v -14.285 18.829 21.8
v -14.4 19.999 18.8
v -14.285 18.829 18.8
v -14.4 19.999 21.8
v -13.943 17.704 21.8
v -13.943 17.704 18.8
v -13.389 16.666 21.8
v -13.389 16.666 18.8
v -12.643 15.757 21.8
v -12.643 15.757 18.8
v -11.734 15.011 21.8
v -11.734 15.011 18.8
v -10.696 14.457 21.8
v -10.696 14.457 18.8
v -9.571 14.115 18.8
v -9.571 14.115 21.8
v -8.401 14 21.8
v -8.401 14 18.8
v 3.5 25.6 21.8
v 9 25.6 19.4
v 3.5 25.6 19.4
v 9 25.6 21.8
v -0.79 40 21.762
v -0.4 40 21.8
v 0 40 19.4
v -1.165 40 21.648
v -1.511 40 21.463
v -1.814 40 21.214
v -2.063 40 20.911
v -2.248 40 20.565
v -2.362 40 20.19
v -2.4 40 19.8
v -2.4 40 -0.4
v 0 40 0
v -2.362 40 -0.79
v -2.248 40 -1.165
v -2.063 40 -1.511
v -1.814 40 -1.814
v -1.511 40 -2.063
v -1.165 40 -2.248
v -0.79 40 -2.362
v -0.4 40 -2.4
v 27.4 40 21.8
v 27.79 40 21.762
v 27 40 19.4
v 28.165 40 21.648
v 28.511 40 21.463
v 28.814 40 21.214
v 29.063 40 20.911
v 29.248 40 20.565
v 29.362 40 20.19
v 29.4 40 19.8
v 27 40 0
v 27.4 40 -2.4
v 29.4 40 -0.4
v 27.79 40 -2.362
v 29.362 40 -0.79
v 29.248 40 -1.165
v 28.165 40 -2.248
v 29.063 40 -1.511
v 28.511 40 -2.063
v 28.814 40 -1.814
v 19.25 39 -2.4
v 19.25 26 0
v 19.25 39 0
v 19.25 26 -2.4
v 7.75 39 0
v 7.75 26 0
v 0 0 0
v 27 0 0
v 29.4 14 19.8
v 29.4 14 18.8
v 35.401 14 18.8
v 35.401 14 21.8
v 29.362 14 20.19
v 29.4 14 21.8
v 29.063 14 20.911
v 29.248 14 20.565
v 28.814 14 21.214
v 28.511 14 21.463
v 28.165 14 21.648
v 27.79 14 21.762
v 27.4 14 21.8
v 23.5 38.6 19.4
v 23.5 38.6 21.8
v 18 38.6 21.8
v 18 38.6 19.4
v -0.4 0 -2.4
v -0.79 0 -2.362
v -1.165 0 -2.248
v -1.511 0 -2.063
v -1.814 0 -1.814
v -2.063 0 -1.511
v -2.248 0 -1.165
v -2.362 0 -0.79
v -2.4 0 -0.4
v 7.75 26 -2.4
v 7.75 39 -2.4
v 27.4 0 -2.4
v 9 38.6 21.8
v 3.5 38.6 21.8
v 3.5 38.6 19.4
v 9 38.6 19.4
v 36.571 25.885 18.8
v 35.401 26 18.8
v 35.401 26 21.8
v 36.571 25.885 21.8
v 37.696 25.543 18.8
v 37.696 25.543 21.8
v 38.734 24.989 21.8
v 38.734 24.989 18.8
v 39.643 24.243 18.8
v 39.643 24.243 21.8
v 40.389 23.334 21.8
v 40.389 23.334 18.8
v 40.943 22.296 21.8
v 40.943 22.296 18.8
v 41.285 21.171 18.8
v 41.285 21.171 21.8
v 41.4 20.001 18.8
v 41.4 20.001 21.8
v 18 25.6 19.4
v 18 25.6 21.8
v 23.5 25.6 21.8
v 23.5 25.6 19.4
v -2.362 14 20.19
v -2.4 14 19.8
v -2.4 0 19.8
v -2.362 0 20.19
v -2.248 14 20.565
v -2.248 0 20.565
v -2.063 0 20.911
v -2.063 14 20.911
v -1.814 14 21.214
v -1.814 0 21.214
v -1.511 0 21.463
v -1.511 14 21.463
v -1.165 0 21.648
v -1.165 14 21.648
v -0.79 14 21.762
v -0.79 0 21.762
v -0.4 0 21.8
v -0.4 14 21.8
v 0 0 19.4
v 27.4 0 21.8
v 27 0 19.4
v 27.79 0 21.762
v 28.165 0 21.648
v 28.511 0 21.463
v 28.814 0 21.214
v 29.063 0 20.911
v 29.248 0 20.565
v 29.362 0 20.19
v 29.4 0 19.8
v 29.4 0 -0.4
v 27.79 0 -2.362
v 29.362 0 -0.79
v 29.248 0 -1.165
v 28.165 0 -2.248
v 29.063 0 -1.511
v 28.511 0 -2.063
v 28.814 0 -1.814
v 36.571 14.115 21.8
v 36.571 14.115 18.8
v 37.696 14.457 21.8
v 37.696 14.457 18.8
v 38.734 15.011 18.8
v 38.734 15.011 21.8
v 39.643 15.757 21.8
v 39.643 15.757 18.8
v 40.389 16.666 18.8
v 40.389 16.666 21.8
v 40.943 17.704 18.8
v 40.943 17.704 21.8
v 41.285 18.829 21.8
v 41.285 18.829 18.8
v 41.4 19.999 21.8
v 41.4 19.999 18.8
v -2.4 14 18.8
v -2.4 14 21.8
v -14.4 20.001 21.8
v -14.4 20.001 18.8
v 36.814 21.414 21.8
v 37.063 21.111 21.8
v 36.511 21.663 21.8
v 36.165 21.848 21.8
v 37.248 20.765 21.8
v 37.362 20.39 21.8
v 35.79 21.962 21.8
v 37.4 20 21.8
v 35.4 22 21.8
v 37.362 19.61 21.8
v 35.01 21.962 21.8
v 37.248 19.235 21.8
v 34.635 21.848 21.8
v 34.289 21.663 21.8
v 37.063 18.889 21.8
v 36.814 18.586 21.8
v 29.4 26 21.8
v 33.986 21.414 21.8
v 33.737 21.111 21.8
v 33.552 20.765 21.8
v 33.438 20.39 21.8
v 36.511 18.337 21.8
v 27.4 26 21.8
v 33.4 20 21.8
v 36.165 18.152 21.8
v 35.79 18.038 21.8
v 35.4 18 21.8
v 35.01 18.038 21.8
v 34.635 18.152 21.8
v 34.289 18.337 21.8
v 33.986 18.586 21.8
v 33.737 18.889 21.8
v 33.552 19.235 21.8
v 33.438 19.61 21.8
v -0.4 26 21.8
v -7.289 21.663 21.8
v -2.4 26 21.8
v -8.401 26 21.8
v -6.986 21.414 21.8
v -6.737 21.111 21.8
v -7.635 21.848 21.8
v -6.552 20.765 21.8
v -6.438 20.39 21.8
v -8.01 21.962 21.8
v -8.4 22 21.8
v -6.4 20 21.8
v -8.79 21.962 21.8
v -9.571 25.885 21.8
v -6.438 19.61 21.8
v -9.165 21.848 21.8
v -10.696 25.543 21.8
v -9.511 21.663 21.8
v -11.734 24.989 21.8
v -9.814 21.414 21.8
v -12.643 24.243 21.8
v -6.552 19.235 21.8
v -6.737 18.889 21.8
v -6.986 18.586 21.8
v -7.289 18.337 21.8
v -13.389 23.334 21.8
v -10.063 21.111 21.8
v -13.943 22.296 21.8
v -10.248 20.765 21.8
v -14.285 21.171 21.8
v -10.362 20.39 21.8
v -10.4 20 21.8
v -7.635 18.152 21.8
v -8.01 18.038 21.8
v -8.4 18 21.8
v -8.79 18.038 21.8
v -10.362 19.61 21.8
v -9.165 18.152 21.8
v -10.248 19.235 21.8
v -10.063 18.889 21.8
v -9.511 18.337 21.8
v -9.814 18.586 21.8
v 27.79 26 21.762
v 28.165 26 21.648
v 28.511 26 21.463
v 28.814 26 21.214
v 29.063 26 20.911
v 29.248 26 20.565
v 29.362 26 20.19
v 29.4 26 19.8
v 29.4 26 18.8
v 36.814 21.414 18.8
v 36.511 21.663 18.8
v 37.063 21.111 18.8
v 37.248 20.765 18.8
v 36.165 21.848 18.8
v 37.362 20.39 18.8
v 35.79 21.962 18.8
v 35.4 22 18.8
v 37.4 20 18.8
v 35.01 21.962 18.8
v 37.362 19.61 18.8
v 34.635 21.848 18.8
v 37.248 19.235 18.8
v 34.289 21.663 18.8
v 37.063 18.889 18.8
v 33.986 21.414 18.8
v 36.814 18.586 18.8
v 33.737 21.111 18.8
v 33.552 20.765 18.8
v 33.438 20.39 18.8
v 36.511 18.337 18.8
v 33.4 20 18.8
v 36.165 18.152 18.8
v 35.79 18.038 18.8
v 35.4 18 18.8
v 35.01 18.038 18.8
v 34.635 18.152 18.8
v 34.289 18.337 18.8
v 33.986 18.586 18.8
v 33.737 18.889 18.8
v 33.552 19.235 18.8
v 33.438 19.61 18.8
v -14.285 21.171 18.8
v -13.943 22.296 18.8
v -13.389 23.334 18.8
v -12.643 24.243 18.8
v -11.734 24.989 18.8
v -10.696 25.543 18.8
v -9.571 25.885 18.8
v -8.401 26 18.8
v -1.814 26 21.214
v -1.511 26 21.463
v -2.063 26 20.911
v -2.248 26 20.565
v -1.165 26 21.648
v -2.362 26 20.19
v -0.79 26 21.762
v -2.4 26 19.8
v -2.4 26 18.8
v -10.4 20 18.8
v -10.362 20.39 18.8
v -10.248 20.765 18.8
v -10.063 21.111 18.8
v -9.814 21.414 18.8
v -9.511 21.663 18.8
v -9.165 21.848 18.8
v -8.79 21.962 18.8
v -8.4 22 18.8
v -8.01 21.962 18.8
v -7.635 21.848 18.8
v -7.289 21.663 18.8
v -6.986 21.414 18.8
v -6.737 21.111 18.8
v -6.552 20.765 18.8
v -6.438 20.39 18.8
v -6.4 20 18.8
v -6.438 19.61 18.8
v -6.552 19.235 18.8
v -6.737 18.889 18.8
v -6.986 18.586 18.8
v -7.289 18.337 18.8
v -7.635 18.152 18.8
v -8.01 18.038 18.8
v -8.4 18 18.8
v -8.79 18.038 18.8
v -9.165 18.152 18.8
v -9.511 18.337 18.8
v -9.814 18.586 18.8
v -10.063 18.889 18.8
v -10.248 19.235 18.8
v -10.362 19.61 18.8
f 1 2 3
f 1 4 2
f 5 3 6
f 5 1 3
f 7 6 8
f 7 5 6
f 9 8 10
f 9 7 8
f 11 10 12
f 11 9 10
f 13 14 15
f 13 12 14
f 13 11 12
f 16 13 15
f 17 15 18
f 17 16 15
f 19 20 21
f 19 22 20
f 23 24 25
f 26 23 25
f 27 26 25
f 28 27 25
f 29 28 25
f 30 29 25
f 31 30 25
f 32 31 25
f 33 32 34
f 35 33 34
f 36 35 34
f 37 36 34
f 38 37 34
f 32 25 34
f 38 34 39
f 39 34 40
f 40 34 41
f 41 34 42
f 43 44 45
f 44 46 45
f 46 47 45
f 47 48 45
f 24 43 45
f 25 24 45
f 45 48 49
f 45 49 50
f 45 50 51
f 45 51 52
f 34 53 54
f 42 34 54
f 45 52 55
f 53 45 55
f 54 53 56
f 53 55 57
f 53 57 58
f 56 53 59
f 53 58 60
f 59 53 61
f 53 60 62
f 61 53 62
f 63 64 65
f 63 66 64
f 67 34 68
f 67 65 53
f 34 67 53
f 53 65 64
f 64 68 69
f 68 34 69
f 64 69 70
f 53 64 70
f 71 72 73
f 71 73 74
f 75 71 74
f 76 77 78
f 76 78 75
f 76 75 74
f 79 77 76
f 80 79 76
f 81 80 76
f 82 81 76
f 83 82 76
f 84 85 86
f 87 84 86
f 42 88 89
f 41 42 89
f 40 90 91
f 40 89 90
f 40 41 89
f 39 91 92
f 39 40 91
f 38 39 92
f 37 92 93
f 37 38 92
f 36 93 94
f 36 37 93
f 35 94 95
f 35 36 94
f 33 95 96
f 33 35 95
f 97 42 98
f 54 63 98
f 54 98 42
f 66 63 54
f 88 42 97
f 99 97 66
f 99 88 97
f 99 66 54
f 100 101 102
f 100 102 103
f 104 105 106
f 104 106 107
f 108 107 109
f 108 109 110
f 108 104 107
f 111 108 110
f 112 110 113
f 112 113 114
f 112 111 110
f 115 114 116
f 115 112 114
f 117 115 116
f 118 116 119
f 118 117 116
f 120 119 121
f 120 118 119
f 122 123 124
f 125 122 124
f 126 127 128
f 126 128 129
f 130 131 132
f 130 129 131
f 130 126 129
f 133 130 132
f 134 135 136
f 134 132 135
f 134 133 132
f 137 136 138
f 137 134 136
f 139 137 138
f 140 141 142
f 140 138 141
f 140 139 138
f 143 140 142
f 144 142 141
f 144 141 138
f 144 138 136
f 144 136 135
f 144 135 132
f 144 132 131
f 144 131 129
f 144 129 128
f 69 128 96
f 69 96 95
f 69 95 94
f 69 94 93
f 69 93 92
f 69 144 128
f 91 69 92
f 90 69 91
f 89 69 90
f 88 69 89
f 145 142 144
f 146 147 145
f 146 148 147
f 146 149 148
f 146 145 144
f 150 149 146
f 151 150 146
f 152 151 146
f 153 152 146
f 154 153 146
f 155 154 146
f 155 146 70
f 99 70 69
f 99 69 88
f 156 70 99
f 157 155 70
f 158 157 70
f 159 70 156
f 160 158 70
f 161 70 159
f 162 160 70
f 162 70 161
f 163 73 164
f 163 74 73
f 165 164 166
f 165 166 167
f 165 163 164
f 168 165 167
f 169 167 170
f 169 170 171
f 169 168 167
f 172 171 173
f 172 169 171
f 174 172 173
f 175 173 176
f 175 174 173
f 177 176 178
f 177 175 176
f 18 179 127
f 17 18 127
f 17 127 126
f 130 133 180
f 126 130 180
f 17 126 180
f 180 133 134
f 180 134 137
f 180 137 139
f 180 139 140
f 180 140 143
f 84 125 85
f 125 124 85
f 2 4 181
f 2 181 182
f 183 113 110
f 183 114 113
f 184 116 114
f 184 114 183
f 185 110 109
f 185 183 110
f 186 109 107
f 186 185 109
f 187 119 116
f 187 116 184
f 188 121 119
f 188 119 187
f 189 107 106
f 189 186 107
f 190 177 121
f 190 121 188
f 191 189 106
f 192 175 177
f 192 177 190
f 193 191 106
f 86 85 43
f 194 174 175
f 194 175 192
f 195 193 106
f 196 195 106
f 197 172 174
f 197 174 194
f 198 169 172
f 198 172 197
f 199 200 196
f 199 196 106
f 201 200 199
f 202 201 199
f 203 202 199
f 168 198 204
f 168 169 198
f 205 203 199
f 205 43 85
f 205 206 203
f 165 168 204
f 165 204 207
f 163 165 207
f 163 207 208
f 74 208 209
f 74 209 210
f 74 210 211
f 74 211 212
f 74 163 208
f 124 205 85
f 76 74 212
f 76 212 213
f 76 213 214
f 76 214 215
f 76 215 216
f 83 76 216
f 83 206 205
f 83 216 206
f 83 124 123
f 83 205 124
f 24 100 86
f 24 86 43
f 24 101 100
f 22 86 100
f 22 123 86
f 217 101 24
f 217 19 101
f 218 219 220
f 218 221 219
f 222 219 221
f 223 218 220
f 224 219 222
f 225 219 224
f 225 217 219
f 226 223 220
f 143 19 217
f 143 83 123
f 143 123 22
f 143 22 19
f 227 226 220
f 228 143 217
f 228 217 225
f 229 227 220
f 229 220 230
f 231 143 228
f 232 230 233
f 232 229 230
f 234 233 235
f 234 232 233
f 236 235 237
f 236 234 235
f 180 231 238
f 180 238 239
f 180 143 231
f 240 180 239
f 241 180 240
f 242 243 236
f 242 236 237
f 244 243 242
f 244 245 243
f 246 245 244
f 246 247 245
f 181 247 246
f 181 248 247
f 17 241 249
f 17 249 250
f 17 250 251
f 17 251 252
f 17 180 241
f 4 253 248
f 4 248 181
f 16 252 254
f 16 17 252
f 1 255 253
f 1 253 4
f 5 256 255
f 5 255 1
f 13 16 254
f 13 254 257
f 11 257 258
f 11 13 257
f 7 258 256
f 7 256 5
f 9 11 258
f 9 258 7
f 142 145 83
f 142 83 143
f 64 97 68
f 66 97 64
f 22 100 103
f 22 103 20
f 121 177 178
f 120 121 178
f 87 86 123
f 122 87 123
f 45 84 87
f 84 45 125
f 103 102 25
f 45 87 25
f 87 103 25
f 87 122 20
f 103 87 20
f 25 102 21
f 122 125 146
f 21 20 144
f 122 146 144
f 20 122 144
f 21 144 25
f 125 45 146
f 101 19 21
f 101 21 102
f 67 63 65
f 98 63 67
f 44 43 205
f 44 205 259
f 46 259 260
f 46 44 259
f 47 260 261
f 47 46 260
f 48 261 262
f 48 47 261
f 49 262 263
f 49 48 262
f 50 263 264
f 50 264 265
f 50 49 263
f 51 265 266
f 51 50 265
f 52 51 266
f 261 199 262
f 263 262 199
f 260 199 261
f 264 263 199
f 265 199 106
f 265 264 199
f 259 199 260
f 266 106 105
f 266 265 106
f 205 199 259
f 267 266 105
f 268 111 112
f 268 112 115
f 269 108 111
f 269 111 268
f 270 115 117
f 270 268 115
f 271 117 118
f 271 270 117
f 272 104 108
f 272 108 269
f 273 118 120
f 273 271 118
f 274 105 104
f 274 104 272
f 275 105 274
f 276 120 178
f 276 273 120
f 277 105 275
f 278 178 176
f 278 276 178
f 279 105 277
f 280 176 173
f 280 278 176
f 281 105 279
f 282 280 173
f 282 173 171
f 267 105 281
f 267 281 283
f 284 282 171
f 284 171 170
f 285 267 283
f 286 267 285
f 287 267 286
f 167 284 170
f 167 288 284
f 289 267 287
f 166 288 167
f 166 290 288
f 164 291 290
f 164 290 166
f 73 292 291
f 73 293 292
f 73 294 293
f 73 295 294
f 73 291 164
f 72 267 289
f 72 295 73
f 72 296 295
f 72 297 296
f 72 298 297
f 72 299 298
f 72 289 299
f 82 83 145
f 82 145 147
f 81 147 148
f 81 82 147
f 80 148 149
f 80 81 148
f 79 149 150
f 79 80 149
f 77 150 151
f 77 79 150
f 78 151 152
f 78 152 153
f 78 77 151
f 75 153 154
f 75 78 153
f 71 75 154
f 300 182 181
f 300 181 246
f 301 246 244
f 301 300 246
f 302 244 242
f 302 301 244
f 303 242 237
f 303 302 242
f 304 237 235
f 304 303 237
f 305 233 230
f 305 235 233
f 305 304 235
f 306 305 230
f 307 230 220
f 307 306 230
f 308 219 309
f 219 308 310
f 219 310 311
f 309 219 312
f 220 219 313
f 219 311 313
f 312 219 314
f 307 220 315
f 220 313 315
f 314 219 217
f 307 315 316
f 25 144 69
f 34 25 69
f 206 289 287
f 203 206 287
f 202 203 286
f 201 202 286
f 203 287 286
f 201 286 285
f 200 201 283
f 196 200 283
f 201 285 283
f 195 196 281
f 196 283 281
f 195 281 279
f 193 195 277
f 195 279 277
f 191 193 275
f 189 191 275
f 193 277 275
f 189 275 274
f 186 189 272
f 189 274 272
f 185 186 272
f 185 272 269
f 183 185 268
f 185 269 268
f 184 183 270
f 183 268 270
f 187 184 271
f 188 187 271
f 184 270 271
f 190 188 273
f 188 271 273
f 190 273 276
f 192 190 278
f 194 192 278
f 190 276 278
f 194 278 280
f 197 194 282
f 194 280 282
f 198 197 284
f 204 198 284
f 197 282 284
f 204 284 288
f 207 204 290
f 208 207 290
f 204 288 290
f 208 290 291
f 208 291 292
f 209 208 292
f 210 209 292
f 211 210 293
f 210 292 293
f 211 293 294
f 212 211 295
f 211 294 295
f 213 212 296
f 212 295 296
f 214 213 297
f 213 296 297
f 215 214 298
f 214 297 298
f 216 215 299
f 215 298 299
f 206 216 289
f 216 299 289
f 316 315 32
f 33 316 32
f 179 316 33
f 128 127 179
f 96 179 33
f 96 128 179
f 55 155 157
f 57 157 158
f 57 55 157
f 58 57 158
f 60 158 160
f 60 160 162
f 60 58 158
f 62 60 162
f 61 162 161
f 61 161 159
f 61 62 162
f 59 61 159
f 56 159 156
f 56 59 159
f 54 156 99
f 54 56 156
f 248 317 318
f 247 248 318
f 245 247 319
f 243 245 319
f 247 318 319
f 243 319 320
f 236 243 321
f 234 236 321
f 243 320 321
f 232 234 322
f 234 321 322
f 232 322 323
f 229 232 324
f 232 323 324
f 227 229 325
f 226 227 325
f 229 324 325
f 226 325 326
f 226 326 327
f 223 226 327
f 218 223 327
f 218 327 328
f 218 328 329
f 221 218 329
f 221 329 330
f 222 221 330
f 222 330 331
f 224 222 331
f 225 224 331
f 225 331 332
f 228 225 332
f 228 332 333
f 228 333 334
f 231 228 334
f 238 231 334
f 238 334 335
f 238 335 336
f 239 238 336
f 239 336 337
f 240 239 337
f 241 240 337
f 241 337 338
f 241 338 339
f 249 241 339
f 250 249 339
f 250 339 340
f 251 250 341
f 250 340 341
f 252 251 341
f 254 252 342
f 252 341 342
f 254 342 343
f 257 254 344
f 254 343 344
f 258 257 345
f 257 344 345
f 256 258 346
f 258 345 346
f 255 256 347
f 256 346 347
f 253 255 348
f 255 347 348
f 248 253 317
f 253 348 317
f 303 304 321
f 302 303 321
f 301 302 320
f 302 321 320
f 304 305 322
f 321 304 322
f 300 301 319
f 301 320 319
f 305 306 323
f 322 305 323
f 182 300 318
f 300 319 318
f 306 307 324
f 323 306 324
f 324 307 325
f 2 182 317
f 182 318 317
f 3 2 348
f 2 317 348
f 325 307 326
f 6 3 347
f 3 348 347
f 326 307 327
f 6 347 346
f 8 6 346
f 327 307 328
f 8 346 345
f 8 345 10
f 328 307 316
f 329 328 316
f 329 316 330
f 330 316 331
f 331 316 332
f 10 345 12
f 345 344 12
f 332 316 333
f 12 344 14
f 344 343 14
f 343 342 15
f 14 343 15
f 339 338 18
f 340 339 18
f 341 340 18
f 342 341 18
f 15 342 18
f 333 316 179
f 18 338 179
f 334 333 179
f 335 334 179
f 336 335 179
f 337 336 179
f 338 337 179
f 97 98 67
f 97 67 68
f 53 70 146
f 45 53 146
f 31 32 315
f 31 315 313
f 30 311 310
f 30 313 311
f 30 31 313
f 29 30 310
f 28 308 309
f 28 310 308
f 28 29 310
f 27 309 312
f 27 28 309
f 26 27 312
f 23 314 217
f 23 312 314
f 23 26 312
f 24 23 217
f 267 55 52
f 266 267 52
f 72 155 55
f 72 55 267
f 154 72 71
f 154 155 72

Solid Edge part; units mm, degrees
sketch "Sketch1" plane through (0, 0, 0) normal (0, -1, 0) x (1, 0, 0)
  line L0 (0, 19.4) -> (0, 0)
  line L1 (0, 0) -> (27, 0)
  line L2 (27, 0) -> (27, 19.4)
  line L3 (27, 19.4) -> (0, 19.4)
  line L4 (-2.4, 21.8) -> (-2.4, -2.4)
  line L5 (-2.4, -2.4) -> (29.4, -2.4)
  line L6 (29.4, -2.4) -> (29.4, 21.8)
  line L7 (29.4, 21.8) -> (-2.4, 21.8)
  dimension "D1" = 19.4
  dimension "D2" = 27
  dimension "D3" = 2.4
extrude "Protrusion1" add sketch "Sketch1" against normal blind 40
sketch "Sketch2" plane through (13.5, 20, 21.8) normal (0, 0, 1) x (-1, 0, 0)
  line L0 (4.5, -18.6) -> (4.5, -5.6)
  line L1 (4.5, -5.6) -> (10, -5.6)
  line L2 (10, -5.6) -> (10, -18.6)
  line L3 (10, -18.6) -> (4.5, -18.6)
  line L4 (-4.5, -18.6) -> (-4.5, -5.6)
  line L5 (-4.5, -5.6) -> (-10, -5.6)
  line L6 (-10, -5.6) -> (-10, -18.6)
  line L7 (-10, -18.6) -> (-4.5, -18.6)
  dimension "D1" = 5.5
  dimension "D2" = 13
  dimension "D3" = 1.4
  dimension "D4" = 9
  dimension "D5" = 9
extrude "Cutout1" cut sketch "Sketch2" against normal up to next
sketch "Sketch3" plane through (13.5, 20, -2.4) normal (0, 0, -1) x (0, 1, 0)
  line L0 (6, 5.75) -> (19, 5.75)
  line L1 (19, 5.75) -> (19, -5.75)
  line L2 (19, -5.75) -> (6, -5.75)
  line L3 (6, -5.75) -> (6, 5.75)
extrude "Cutout2" cut sketch "Sketch3" against normal up to next
sketch "Sketch4" plane through (-2.4, 20, 9.7) normal (-1, 0, 0) x (0, 0, -1)
  line L0 (-9.1, -6) -> (-9.1, 6)
  line L1 (-9.1, 6) -> (-12.1, 6)
  line L2 (-12.1, 6) -> (-12.1, -6)
  line L3 (-12.1, -6) -> (-9.1, -6)
extrude "ProtrusiónExtruida_2" add sketch "Sketch4" along normal blind 12
sketch "Sketch5" plane through (29.4, 20, 9.7) normal (1, 0, 0) x (0, 1, 0)
  line L0 (6, 12.1) -> (6, 9.1)
  line L1 (6, 9.1) -> (-6, 9.1)
  line L2 (-6, 9.1) -> (-6, 12.1)
  line L3 (-6, 12.1) -> (6, 12.1)
extrude "ProtrusiónExtruida_3" add sketch "Sketch5" along normal blind 12
fillet "Redondeo_1" radius 6 4 edges at (41.4, 14, 20.3) (41.4, 26, 20.3) (-14.4, 26, 20.3) (-14.4, 14, 20.3)
sketch "Sketch6" plane through (35.4, 20, 18.8) normal (0, 0, -1) x (-1, 0, 0)
  circle A0 centre (0, 0) radius 2
  circle A1 centre (43.8, 0) radius 2
  dimension "D1" = 4
extrude "Cutout3" cut sketch "Sketch6" against normal up to next
fillet "Redondeo_4" radius 2 6 edges at (29.4, 7, 21.8) (29.4, 33, 21.8) (-2.4, 7, 21.8) (-2.4, 33, 21.8) (-2.4, 20, -2.4) (29.4, 20, -2.4)
